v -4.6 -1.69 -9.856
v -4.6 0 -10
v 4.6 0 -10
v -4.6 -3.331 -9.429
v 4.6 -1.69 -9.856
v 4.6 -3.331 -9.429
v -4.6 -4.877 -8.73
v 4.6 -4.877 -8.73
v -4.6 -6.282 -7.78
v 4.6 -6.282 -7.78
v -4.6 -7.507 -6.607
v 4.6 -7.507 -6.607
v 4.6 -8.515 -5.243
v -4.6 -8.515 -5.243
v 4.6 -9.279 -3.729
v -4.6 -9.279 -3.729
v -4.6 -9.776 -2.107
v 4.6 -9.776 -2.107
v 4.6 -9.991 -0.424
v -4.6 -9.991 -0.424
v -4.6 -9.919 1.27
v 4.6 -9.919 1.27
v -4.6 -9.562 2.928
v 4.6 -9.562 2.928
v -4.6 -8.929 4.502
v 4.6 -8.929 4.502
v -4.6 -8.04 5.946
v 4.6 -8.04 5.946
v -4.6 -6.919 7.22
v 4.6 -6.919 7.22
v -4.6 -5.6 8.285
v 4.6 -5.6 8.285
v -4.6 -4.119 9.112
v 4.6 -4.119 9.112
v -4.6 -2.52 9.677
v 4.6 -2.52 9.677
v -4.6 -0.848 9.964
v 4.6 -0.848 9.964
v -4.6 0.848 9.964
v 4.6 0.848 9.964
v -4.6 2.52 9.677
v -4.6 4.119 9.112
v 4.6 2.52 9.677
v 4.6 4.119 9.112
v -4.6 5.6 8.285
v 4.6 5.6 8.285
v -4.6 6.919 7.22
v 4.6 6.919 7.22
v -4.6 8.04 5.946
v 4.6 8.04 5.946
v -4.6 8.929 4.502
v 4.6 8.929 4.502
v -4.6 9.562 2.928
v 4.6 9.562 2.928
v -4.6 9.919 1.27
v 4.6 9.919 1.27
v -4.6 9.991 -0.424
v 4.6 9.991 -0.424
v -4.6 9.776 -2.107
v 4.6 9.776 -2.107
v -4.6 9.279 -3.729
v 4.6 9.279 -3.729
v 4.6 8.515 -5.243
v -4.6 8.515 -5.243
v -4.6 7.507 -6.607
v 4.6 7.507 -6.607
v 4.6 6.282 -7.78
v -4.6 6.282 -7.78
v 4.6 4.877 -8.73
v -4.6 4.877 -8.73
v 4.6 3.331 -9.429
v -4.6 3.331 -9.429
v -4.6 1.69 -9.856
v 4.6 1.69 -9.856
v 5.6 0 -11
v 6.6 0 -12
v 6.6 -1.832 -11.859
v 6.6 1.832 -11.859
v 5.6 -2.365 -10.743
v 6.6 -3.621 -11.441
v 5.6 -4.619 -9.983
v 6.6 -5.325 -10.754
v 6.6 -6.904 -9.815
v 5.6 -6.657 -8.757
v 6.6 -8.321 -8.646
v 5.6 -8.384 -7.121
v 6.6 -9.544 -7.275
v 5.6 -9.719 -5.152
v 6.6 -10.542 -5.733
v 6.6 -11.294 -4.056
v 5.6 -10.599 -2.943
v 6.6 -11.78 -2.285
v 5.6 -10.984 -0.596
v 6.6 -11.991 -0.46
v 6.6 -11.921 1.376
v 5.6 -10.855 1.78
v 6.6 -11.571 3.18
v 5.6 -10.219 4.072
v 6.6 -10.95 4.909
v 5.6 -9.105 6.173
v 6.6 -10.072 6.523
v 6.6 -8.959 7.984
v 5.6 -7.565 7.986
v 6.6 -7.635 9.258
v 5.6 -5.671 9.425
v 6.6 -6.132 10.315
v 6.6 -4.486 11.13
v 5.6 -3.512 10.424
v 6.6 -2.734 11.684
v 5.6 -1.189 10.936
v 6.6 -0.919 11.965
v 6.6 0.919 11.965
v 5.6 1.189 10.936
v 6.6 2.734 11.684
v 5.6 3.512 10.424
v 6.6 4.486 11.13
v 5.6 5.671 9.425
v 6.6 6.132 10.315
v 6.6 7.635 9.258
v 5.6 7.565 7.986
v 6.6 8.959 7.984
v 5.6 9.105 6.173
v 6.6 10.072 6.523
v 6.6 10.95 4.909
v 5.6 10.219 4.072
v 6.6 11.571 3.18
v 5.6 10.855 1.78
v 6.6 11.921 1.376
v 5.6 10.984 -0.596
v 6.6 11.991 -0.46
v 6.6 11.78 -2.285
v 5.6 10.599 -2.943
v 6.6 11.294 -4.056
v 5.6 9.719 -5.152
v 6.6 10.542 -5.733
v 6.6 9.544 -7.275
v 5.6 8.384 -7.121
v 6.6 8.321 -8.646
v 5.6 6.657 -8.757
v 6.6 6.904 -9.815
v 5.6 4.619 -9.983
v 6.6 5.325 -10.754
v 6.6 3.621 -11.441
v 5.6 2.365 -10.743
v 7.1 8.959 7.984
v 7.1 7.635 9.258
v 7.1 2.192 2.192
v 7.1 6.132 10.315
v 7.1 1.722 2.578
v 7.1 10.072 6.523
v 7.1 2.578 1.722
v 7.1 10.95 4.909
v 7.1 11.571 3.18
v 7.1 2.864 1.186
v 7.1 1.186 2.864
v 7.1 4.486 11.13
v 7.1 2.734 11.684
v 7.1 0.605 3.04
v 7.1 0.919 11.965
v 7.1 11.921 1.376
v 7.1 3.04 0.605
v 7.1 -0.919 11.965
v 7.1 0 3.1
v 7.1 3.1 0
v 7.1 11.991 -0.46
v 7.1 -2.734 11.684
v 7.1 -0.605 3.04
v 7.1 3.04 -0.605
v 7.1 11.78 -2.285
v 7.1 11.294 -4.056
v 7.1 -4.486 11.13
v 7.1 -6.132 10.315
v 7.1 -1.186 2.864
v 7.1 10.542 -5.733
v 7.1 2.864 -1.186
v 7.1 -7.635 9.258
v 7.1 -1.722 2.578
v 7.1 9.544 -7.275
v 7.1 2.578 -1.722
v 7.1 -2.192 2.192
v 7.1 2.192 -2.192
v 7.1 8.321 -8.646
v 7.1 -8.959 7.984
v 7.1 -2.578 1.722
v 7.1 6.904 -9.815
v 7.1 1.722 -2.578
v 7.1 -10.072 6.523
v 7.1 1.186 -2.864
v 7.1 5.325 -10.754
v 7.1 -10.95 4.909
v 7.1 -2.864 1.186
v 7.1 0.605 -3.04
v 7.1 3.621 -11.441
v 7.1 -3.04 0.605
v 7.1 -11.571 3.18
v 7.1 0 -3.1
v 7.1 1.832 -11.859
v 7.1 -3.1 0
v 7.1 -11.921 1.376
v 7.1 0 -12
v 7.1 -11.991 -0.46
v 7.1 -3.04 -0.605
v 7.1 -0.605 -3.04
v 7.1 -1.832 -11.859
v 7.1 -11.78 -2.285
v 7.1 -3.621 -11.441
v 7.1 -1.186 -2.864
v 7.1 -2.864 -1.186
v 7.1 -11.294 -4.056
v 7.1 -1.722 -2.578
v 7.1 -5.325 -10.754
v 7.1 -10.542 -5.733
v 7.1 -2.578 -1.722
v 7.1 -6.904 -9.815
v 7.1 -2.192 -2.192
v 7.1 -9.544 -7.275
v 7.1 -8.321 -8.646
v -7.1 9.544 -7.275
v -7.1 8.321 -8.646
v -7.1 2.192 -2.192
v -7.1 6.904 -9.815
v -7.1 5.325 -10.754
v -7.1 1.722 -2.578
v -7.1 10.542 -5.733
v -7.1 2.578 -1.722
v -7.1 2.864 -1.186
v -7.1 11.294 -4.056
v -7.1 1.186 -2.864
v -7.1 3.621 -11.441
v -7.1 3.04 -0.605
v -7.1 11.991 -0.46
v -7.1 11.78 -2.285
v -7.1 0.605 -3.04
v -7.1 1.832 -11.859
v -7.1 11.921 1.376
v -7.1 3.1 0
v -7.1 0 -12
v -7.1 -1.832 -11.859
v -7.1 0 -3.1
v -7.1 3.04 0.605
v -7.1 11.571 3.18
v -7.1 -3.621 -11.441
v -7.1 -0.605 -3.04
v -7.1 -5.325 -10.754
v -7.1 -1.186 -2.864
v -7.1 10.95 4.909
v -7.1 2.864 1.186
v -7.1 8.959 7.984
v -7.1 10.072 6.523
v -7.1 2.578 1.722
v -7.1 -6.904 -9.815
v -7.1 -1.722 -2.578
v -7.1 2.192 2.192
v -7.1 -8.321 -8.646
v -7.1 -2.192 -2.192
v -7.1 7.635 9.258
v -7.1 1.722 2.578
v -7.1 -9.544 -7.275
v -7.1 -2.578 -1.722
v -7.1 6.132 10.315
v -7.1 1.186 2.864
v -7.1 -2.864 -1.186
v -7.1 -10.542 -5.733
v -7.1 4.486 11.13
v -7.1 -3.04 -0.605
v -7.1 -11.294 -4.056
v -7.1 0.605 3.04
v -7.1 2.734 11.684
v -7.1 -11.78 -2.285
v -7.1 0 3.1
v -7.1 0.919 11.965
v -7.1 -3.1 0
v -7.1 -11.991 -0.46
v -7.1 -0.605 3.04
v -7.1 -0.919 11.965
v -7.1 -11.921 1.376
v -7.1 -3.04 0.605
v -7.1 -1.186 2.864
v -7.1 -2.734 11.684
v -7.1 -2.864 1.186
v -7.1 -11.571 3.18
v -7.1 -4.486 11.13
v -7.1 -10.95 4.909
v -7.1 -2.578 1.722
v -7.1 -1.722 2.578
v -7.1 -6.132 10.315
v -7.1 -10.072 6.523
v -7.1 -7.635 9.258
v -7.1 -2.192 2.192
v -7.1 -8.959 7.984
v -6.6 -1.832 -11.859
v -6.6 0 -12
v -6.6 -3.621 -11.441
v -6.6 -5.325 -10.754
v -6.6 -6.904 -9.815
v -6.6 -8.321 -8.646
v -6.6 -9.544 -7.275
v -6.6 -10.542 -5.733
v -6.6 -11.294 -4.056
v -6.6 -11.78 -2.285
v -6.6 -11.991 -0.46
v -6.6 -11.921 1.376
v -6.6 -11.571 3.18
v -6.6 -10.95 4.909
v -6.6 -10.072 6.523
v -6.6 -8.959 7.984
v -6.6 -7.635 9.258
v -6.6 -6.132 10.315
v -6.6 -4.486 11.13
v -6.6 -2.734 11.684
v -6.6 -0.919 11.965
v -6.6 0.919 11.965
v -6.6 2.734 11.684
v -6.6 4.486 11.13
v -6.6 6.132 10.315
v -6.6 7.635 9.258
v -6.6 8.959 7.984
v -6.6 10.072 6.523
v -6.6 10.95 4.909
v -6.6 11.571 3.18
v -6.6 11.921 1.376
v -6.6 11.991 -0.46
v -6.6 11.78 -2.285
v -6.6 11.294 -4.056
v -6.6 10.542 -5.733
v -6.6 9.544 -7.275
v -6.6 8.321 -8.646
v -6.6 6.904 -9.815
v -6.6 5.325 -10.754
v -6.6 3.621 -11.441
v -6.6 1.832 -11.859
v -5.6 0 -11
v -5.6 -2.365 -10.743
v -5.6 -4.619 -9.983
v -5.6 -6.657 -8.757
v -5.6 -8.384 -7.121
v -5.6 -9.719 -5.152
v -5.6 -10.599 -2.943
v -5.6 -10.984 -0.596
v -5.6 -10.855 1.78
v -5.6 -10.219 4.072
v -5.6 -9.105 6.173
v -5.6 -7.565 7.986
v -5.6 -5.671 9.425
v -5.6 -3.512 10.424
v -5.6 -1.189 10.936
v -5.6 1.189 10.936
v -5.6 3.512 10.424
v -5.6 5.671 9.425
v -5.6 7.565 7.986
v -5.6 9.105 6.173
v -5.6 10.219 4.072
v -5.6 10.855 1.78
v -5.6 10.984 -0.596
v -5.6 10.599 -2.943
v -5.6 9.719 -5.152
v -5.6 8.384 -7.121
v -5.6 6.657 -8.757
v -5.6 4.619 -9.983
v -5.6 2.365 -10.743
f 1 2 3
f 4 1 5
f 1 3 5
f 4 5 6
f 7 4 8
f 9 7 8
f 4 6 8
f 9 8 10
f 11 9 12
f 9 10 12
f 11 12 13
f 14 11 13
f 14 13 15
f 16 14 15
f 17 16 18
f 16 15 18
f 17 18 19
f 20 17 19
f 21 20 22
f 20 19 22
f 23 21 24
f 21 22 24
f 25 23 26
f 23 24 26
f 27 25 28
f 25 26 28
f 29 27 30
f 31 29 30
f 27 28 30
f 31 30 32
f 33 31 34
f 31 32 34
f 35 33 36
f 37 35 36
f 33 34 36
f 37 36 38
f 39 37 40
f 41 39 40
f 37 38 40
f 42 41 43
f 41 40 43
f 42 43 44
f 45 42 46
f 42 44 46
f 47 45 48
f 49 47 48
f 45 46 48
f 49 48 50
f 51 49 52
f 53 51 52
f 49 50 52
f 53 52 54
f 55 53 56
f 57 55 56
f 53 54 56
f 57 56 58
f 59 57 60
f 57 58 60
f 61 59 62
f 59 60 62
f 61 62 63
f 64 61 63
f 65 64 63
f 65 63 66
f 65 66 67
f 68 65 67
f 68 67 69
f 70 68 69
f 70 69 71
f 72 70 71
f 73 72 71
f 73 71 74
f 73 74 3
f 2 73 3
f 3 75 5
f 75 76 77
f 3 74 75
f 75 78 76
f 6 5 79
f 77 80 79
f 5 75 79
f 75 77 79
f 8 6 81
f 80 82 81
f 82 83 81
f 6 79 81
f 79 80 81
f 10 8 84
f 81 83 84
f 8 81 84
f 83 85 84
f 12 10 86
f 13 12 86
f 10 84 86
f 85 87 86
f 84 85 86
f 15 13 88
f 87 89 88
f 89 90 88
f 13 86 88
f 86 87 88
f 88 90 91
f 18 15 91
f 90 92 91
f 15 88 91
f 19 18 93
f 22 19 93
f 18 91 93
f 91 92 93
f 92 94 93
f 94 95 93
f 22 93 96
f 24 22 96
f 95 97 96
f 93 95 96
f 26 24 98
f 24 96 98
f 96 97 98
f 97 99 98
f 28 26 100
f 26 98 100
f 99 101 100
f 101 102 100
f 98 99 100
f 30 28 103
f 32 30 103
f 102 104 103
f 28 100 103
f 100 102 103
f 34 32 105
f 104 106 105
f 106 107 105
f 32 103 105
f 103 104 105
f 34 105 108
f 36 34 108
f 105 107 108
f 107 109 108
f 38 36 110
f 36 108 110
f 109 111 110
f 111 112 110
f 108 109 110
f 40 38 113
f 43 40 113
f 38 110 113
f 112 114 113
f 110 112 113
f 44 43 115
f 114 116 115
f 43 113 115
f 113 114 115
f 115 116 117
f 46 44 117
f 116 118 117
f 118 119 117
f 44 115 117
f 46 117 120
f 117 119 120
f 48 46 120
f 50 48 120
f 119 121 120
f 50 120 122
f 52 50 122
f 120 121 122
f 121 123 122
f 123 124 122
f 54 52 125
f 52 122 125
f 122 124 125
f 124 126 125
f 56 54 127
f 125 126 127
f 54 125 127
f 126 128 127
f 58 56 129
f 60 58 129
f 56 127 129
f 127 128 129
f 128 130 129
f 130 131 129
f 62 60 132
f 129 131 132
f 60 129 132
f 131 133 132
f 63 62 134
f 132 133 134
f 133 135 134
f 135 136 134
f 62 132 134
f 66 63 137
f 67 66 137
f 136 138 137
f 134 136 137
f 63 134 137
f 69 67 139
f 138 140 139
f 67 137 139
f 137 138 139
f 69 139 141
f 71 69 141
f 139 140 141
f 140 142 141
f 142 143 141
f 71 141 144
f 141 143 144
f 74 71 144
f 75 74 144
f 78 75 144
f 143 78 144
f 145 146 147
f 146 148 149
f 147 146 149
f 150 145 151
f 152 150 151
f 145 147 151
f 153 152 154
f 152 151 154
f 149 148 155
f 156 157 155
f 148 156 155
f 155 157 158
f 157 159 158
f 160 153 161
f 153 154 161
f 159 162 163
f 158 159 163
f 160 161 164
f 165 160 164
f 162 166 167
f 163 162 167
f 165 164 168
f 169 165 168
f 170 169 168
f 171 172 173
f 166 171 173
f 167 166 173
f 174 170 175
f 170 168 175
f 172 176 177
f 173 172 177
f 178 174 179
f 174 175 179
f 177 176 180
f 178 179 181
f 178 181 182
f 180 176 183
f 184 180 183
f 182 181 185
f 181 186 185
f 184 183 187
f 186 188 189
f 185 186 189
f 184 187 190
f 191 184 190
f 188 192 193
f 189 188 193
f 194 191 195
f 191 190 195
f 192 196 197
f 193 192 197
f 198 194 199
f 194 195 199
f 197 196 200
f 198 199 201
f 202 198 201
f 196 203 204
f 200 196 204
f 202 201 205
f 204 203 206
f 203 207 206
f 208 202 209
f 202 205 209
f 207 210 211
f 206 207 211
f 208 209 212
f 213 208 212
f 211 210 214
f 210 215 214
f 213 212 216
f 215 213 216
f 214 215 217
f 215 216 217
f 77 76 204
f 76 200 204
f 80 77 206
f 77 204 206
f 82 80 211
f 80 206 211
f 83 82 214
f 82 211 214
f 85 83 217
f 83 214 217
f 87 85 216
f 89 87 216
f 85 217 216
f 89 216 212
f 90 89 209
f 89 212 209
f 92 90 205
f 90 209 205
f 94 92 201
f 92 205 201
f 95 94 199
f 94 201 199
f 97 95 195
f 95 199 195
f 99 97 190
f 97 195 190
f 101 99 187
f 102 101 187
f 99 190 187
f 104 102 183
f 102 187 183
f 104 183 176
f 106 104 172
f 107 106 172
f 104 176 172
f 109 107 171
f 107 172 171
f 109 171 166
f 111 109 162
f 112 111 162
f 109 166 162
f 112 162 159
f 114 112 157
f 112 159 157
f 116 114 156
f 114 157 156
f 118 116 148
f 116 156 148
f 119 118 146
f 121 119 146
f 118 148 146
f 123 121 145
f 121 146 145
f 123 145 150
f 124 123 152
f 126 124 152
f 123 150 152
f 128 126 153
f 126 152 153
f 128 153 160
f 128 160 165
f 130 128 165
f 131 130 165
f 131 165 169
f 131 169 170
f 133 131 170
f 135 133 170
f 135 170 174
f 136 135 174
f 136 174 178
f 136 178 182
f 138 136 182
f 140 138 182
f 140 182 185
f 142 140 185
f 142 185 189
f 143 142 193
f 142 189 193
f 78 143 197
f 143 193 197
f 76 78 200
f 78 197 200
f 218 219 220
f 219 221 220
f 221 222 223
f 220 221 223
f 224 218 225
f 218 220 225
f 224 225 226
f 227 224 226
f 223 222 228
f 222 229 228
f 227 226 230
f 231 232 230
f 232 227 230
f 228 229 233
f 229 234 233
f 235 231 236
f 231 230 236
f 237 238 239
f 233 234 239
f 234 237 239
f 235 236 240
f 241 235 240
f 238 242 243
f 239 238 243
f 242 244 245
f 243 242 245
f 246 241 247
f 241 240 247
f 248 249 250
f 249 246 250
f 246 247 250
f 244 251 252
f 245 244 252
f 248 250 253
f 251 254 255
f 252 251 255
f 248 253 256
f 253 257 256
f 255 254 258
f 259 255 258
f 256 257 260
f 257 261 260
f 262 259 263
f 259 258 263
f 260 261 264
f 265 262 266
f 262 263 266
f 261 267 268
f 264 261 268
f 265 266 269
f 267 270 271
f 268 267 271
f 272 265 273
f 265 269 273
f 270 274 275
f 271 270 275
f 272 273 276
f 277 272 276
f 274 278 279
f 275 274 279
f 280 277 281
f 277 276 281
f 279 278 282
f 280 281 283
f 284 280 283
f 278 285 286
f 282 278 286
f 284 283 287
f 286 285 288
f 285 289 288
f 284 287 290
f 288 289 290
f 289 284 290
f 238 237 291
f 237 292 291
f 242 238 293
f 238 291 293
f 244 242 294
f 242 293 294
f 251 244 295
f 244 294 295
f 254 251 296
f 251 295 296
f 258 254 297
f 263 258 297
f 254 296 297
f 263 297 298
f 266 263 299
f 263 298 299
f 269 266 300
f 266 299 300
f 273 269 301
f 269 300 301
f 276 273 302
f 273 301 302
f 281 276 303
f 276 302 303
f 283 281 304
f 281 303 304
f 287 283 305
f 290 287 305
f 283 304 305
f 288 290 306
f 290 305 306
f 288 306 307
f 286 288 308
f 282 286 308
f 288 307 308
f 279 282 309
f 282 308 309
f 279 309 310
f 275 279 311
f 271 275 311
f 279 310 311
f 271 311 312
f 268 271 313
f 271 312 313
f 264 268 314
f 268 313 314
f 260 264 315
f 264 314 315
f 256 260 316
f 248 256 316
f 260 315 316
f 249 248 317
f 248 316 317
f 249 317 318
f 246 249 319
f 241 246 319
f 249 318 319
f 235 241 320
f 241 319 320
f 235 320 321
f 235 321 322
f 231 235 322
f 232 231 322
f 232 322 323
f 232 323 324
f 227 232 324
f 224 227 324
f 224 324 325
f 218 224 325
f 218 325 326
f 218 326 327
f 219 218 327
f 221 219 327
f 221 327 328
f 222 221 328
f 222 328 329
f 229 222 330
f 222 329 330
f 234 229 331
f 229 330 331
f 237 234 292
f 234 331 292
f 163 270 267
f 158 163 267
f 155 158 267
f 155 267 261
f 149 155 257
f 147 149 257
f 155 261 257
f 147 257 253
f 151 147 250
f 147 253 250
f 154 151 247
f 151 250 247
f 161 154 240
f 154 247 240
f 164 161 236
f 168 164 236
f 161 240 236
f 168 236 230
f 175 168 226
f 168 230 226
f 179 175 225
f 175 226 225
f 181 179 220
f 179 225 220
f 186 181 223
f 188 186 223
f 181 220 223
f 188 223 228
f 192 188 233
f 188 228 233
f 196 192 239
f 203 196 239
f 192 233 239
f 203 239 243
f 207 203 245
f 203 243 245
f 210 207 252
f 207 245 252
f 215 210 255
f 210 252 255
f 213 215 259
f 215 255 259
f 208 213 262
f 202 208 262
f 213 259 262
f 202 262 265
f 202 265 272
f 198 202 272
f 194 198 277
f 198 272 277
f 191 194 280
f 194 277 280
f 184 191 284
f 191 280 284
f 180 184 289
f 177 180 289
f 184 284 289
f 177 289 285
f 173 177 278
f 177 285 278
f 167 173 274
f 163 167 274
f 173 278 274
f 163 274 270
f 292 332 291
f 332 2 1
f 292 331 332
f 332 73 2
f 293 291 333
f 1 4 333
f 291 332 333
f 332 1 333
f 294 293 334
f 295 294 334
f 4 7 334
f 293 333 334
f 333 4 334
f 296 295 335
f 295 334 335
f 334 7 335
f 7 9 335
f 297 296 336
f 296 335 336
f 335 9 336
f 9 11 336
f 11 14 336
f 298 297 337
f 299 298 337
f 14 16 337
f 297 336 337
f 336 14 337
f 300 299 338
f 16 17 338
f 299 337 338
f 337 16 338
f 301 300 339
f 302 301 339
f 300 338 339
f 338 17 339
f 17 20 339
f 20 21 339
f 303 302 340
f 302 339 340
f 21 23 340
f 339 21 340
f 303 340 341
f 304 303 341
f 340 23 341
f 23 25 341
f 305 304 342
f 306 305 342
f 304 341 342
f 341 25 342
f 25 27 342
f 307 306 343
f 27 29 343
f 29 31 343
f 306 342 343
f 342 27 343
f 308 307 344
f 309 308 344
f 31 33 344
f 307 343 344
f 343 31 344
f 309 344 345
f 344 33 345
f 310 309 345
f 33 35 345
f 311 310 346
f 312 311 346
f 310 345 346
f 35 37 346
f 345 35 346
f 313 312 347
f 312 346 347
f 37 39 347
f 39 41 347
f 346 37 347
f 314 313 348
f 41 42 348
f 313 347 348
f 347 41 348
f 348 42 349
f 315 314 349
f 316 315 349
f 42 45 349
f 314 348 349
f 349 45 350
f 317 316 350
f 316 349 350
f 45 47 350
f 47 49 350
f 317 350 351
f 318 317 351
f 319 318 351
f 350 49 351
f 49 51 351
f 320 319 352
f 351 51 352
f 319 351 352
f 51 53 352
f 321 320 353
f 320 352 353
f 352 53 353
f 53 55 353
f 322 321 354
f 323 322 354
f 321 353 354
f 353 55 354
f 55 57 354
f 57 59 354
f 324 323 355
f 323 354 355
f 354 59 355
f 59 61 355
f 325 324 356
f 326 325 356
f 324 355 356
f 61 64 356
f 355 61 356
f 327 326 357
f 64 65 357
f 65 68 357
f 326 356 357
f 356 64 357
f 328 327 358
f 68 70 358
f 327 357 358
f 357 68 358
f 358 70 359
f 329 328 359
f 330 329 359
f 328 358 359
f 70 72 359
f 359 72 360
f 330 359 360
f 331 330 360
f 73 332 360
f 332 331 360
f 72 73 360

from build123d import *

# Parameters (mm, degrees)
SKETCH3_R          = 3.1
CUT_EXTRUDE1_DEPTH = 14.2


with BuildPart() as part:
    # Sketch2 → Revolve1 (revolve)
    with BuildSketch(Plane(origin=(0, 0, 0), x_dir=(1, 0, 0), z_dir=(0, 1, 0))):
        Polygon((-7.1, 12), (-6.6, 12), (-4.6, 10), (4.6, 10), (6.6, 12), (7.1, 12), (7.1, 0), (-7.1, 0), align=None)
    revolve(axis=Axis((7.1, 0, 0), (-1, 0, 0)))

    # Sketch3 → Cut-Extrude1 (cut)
    with BuildSketch(Plane.ZY.offset(7.1)):
        Circle(SKETCH3_R)
    extrude(amount=-CUT_EXTRUDE1_DEPTH, mode=Mode.SUBTRACT)


solid = part.part
